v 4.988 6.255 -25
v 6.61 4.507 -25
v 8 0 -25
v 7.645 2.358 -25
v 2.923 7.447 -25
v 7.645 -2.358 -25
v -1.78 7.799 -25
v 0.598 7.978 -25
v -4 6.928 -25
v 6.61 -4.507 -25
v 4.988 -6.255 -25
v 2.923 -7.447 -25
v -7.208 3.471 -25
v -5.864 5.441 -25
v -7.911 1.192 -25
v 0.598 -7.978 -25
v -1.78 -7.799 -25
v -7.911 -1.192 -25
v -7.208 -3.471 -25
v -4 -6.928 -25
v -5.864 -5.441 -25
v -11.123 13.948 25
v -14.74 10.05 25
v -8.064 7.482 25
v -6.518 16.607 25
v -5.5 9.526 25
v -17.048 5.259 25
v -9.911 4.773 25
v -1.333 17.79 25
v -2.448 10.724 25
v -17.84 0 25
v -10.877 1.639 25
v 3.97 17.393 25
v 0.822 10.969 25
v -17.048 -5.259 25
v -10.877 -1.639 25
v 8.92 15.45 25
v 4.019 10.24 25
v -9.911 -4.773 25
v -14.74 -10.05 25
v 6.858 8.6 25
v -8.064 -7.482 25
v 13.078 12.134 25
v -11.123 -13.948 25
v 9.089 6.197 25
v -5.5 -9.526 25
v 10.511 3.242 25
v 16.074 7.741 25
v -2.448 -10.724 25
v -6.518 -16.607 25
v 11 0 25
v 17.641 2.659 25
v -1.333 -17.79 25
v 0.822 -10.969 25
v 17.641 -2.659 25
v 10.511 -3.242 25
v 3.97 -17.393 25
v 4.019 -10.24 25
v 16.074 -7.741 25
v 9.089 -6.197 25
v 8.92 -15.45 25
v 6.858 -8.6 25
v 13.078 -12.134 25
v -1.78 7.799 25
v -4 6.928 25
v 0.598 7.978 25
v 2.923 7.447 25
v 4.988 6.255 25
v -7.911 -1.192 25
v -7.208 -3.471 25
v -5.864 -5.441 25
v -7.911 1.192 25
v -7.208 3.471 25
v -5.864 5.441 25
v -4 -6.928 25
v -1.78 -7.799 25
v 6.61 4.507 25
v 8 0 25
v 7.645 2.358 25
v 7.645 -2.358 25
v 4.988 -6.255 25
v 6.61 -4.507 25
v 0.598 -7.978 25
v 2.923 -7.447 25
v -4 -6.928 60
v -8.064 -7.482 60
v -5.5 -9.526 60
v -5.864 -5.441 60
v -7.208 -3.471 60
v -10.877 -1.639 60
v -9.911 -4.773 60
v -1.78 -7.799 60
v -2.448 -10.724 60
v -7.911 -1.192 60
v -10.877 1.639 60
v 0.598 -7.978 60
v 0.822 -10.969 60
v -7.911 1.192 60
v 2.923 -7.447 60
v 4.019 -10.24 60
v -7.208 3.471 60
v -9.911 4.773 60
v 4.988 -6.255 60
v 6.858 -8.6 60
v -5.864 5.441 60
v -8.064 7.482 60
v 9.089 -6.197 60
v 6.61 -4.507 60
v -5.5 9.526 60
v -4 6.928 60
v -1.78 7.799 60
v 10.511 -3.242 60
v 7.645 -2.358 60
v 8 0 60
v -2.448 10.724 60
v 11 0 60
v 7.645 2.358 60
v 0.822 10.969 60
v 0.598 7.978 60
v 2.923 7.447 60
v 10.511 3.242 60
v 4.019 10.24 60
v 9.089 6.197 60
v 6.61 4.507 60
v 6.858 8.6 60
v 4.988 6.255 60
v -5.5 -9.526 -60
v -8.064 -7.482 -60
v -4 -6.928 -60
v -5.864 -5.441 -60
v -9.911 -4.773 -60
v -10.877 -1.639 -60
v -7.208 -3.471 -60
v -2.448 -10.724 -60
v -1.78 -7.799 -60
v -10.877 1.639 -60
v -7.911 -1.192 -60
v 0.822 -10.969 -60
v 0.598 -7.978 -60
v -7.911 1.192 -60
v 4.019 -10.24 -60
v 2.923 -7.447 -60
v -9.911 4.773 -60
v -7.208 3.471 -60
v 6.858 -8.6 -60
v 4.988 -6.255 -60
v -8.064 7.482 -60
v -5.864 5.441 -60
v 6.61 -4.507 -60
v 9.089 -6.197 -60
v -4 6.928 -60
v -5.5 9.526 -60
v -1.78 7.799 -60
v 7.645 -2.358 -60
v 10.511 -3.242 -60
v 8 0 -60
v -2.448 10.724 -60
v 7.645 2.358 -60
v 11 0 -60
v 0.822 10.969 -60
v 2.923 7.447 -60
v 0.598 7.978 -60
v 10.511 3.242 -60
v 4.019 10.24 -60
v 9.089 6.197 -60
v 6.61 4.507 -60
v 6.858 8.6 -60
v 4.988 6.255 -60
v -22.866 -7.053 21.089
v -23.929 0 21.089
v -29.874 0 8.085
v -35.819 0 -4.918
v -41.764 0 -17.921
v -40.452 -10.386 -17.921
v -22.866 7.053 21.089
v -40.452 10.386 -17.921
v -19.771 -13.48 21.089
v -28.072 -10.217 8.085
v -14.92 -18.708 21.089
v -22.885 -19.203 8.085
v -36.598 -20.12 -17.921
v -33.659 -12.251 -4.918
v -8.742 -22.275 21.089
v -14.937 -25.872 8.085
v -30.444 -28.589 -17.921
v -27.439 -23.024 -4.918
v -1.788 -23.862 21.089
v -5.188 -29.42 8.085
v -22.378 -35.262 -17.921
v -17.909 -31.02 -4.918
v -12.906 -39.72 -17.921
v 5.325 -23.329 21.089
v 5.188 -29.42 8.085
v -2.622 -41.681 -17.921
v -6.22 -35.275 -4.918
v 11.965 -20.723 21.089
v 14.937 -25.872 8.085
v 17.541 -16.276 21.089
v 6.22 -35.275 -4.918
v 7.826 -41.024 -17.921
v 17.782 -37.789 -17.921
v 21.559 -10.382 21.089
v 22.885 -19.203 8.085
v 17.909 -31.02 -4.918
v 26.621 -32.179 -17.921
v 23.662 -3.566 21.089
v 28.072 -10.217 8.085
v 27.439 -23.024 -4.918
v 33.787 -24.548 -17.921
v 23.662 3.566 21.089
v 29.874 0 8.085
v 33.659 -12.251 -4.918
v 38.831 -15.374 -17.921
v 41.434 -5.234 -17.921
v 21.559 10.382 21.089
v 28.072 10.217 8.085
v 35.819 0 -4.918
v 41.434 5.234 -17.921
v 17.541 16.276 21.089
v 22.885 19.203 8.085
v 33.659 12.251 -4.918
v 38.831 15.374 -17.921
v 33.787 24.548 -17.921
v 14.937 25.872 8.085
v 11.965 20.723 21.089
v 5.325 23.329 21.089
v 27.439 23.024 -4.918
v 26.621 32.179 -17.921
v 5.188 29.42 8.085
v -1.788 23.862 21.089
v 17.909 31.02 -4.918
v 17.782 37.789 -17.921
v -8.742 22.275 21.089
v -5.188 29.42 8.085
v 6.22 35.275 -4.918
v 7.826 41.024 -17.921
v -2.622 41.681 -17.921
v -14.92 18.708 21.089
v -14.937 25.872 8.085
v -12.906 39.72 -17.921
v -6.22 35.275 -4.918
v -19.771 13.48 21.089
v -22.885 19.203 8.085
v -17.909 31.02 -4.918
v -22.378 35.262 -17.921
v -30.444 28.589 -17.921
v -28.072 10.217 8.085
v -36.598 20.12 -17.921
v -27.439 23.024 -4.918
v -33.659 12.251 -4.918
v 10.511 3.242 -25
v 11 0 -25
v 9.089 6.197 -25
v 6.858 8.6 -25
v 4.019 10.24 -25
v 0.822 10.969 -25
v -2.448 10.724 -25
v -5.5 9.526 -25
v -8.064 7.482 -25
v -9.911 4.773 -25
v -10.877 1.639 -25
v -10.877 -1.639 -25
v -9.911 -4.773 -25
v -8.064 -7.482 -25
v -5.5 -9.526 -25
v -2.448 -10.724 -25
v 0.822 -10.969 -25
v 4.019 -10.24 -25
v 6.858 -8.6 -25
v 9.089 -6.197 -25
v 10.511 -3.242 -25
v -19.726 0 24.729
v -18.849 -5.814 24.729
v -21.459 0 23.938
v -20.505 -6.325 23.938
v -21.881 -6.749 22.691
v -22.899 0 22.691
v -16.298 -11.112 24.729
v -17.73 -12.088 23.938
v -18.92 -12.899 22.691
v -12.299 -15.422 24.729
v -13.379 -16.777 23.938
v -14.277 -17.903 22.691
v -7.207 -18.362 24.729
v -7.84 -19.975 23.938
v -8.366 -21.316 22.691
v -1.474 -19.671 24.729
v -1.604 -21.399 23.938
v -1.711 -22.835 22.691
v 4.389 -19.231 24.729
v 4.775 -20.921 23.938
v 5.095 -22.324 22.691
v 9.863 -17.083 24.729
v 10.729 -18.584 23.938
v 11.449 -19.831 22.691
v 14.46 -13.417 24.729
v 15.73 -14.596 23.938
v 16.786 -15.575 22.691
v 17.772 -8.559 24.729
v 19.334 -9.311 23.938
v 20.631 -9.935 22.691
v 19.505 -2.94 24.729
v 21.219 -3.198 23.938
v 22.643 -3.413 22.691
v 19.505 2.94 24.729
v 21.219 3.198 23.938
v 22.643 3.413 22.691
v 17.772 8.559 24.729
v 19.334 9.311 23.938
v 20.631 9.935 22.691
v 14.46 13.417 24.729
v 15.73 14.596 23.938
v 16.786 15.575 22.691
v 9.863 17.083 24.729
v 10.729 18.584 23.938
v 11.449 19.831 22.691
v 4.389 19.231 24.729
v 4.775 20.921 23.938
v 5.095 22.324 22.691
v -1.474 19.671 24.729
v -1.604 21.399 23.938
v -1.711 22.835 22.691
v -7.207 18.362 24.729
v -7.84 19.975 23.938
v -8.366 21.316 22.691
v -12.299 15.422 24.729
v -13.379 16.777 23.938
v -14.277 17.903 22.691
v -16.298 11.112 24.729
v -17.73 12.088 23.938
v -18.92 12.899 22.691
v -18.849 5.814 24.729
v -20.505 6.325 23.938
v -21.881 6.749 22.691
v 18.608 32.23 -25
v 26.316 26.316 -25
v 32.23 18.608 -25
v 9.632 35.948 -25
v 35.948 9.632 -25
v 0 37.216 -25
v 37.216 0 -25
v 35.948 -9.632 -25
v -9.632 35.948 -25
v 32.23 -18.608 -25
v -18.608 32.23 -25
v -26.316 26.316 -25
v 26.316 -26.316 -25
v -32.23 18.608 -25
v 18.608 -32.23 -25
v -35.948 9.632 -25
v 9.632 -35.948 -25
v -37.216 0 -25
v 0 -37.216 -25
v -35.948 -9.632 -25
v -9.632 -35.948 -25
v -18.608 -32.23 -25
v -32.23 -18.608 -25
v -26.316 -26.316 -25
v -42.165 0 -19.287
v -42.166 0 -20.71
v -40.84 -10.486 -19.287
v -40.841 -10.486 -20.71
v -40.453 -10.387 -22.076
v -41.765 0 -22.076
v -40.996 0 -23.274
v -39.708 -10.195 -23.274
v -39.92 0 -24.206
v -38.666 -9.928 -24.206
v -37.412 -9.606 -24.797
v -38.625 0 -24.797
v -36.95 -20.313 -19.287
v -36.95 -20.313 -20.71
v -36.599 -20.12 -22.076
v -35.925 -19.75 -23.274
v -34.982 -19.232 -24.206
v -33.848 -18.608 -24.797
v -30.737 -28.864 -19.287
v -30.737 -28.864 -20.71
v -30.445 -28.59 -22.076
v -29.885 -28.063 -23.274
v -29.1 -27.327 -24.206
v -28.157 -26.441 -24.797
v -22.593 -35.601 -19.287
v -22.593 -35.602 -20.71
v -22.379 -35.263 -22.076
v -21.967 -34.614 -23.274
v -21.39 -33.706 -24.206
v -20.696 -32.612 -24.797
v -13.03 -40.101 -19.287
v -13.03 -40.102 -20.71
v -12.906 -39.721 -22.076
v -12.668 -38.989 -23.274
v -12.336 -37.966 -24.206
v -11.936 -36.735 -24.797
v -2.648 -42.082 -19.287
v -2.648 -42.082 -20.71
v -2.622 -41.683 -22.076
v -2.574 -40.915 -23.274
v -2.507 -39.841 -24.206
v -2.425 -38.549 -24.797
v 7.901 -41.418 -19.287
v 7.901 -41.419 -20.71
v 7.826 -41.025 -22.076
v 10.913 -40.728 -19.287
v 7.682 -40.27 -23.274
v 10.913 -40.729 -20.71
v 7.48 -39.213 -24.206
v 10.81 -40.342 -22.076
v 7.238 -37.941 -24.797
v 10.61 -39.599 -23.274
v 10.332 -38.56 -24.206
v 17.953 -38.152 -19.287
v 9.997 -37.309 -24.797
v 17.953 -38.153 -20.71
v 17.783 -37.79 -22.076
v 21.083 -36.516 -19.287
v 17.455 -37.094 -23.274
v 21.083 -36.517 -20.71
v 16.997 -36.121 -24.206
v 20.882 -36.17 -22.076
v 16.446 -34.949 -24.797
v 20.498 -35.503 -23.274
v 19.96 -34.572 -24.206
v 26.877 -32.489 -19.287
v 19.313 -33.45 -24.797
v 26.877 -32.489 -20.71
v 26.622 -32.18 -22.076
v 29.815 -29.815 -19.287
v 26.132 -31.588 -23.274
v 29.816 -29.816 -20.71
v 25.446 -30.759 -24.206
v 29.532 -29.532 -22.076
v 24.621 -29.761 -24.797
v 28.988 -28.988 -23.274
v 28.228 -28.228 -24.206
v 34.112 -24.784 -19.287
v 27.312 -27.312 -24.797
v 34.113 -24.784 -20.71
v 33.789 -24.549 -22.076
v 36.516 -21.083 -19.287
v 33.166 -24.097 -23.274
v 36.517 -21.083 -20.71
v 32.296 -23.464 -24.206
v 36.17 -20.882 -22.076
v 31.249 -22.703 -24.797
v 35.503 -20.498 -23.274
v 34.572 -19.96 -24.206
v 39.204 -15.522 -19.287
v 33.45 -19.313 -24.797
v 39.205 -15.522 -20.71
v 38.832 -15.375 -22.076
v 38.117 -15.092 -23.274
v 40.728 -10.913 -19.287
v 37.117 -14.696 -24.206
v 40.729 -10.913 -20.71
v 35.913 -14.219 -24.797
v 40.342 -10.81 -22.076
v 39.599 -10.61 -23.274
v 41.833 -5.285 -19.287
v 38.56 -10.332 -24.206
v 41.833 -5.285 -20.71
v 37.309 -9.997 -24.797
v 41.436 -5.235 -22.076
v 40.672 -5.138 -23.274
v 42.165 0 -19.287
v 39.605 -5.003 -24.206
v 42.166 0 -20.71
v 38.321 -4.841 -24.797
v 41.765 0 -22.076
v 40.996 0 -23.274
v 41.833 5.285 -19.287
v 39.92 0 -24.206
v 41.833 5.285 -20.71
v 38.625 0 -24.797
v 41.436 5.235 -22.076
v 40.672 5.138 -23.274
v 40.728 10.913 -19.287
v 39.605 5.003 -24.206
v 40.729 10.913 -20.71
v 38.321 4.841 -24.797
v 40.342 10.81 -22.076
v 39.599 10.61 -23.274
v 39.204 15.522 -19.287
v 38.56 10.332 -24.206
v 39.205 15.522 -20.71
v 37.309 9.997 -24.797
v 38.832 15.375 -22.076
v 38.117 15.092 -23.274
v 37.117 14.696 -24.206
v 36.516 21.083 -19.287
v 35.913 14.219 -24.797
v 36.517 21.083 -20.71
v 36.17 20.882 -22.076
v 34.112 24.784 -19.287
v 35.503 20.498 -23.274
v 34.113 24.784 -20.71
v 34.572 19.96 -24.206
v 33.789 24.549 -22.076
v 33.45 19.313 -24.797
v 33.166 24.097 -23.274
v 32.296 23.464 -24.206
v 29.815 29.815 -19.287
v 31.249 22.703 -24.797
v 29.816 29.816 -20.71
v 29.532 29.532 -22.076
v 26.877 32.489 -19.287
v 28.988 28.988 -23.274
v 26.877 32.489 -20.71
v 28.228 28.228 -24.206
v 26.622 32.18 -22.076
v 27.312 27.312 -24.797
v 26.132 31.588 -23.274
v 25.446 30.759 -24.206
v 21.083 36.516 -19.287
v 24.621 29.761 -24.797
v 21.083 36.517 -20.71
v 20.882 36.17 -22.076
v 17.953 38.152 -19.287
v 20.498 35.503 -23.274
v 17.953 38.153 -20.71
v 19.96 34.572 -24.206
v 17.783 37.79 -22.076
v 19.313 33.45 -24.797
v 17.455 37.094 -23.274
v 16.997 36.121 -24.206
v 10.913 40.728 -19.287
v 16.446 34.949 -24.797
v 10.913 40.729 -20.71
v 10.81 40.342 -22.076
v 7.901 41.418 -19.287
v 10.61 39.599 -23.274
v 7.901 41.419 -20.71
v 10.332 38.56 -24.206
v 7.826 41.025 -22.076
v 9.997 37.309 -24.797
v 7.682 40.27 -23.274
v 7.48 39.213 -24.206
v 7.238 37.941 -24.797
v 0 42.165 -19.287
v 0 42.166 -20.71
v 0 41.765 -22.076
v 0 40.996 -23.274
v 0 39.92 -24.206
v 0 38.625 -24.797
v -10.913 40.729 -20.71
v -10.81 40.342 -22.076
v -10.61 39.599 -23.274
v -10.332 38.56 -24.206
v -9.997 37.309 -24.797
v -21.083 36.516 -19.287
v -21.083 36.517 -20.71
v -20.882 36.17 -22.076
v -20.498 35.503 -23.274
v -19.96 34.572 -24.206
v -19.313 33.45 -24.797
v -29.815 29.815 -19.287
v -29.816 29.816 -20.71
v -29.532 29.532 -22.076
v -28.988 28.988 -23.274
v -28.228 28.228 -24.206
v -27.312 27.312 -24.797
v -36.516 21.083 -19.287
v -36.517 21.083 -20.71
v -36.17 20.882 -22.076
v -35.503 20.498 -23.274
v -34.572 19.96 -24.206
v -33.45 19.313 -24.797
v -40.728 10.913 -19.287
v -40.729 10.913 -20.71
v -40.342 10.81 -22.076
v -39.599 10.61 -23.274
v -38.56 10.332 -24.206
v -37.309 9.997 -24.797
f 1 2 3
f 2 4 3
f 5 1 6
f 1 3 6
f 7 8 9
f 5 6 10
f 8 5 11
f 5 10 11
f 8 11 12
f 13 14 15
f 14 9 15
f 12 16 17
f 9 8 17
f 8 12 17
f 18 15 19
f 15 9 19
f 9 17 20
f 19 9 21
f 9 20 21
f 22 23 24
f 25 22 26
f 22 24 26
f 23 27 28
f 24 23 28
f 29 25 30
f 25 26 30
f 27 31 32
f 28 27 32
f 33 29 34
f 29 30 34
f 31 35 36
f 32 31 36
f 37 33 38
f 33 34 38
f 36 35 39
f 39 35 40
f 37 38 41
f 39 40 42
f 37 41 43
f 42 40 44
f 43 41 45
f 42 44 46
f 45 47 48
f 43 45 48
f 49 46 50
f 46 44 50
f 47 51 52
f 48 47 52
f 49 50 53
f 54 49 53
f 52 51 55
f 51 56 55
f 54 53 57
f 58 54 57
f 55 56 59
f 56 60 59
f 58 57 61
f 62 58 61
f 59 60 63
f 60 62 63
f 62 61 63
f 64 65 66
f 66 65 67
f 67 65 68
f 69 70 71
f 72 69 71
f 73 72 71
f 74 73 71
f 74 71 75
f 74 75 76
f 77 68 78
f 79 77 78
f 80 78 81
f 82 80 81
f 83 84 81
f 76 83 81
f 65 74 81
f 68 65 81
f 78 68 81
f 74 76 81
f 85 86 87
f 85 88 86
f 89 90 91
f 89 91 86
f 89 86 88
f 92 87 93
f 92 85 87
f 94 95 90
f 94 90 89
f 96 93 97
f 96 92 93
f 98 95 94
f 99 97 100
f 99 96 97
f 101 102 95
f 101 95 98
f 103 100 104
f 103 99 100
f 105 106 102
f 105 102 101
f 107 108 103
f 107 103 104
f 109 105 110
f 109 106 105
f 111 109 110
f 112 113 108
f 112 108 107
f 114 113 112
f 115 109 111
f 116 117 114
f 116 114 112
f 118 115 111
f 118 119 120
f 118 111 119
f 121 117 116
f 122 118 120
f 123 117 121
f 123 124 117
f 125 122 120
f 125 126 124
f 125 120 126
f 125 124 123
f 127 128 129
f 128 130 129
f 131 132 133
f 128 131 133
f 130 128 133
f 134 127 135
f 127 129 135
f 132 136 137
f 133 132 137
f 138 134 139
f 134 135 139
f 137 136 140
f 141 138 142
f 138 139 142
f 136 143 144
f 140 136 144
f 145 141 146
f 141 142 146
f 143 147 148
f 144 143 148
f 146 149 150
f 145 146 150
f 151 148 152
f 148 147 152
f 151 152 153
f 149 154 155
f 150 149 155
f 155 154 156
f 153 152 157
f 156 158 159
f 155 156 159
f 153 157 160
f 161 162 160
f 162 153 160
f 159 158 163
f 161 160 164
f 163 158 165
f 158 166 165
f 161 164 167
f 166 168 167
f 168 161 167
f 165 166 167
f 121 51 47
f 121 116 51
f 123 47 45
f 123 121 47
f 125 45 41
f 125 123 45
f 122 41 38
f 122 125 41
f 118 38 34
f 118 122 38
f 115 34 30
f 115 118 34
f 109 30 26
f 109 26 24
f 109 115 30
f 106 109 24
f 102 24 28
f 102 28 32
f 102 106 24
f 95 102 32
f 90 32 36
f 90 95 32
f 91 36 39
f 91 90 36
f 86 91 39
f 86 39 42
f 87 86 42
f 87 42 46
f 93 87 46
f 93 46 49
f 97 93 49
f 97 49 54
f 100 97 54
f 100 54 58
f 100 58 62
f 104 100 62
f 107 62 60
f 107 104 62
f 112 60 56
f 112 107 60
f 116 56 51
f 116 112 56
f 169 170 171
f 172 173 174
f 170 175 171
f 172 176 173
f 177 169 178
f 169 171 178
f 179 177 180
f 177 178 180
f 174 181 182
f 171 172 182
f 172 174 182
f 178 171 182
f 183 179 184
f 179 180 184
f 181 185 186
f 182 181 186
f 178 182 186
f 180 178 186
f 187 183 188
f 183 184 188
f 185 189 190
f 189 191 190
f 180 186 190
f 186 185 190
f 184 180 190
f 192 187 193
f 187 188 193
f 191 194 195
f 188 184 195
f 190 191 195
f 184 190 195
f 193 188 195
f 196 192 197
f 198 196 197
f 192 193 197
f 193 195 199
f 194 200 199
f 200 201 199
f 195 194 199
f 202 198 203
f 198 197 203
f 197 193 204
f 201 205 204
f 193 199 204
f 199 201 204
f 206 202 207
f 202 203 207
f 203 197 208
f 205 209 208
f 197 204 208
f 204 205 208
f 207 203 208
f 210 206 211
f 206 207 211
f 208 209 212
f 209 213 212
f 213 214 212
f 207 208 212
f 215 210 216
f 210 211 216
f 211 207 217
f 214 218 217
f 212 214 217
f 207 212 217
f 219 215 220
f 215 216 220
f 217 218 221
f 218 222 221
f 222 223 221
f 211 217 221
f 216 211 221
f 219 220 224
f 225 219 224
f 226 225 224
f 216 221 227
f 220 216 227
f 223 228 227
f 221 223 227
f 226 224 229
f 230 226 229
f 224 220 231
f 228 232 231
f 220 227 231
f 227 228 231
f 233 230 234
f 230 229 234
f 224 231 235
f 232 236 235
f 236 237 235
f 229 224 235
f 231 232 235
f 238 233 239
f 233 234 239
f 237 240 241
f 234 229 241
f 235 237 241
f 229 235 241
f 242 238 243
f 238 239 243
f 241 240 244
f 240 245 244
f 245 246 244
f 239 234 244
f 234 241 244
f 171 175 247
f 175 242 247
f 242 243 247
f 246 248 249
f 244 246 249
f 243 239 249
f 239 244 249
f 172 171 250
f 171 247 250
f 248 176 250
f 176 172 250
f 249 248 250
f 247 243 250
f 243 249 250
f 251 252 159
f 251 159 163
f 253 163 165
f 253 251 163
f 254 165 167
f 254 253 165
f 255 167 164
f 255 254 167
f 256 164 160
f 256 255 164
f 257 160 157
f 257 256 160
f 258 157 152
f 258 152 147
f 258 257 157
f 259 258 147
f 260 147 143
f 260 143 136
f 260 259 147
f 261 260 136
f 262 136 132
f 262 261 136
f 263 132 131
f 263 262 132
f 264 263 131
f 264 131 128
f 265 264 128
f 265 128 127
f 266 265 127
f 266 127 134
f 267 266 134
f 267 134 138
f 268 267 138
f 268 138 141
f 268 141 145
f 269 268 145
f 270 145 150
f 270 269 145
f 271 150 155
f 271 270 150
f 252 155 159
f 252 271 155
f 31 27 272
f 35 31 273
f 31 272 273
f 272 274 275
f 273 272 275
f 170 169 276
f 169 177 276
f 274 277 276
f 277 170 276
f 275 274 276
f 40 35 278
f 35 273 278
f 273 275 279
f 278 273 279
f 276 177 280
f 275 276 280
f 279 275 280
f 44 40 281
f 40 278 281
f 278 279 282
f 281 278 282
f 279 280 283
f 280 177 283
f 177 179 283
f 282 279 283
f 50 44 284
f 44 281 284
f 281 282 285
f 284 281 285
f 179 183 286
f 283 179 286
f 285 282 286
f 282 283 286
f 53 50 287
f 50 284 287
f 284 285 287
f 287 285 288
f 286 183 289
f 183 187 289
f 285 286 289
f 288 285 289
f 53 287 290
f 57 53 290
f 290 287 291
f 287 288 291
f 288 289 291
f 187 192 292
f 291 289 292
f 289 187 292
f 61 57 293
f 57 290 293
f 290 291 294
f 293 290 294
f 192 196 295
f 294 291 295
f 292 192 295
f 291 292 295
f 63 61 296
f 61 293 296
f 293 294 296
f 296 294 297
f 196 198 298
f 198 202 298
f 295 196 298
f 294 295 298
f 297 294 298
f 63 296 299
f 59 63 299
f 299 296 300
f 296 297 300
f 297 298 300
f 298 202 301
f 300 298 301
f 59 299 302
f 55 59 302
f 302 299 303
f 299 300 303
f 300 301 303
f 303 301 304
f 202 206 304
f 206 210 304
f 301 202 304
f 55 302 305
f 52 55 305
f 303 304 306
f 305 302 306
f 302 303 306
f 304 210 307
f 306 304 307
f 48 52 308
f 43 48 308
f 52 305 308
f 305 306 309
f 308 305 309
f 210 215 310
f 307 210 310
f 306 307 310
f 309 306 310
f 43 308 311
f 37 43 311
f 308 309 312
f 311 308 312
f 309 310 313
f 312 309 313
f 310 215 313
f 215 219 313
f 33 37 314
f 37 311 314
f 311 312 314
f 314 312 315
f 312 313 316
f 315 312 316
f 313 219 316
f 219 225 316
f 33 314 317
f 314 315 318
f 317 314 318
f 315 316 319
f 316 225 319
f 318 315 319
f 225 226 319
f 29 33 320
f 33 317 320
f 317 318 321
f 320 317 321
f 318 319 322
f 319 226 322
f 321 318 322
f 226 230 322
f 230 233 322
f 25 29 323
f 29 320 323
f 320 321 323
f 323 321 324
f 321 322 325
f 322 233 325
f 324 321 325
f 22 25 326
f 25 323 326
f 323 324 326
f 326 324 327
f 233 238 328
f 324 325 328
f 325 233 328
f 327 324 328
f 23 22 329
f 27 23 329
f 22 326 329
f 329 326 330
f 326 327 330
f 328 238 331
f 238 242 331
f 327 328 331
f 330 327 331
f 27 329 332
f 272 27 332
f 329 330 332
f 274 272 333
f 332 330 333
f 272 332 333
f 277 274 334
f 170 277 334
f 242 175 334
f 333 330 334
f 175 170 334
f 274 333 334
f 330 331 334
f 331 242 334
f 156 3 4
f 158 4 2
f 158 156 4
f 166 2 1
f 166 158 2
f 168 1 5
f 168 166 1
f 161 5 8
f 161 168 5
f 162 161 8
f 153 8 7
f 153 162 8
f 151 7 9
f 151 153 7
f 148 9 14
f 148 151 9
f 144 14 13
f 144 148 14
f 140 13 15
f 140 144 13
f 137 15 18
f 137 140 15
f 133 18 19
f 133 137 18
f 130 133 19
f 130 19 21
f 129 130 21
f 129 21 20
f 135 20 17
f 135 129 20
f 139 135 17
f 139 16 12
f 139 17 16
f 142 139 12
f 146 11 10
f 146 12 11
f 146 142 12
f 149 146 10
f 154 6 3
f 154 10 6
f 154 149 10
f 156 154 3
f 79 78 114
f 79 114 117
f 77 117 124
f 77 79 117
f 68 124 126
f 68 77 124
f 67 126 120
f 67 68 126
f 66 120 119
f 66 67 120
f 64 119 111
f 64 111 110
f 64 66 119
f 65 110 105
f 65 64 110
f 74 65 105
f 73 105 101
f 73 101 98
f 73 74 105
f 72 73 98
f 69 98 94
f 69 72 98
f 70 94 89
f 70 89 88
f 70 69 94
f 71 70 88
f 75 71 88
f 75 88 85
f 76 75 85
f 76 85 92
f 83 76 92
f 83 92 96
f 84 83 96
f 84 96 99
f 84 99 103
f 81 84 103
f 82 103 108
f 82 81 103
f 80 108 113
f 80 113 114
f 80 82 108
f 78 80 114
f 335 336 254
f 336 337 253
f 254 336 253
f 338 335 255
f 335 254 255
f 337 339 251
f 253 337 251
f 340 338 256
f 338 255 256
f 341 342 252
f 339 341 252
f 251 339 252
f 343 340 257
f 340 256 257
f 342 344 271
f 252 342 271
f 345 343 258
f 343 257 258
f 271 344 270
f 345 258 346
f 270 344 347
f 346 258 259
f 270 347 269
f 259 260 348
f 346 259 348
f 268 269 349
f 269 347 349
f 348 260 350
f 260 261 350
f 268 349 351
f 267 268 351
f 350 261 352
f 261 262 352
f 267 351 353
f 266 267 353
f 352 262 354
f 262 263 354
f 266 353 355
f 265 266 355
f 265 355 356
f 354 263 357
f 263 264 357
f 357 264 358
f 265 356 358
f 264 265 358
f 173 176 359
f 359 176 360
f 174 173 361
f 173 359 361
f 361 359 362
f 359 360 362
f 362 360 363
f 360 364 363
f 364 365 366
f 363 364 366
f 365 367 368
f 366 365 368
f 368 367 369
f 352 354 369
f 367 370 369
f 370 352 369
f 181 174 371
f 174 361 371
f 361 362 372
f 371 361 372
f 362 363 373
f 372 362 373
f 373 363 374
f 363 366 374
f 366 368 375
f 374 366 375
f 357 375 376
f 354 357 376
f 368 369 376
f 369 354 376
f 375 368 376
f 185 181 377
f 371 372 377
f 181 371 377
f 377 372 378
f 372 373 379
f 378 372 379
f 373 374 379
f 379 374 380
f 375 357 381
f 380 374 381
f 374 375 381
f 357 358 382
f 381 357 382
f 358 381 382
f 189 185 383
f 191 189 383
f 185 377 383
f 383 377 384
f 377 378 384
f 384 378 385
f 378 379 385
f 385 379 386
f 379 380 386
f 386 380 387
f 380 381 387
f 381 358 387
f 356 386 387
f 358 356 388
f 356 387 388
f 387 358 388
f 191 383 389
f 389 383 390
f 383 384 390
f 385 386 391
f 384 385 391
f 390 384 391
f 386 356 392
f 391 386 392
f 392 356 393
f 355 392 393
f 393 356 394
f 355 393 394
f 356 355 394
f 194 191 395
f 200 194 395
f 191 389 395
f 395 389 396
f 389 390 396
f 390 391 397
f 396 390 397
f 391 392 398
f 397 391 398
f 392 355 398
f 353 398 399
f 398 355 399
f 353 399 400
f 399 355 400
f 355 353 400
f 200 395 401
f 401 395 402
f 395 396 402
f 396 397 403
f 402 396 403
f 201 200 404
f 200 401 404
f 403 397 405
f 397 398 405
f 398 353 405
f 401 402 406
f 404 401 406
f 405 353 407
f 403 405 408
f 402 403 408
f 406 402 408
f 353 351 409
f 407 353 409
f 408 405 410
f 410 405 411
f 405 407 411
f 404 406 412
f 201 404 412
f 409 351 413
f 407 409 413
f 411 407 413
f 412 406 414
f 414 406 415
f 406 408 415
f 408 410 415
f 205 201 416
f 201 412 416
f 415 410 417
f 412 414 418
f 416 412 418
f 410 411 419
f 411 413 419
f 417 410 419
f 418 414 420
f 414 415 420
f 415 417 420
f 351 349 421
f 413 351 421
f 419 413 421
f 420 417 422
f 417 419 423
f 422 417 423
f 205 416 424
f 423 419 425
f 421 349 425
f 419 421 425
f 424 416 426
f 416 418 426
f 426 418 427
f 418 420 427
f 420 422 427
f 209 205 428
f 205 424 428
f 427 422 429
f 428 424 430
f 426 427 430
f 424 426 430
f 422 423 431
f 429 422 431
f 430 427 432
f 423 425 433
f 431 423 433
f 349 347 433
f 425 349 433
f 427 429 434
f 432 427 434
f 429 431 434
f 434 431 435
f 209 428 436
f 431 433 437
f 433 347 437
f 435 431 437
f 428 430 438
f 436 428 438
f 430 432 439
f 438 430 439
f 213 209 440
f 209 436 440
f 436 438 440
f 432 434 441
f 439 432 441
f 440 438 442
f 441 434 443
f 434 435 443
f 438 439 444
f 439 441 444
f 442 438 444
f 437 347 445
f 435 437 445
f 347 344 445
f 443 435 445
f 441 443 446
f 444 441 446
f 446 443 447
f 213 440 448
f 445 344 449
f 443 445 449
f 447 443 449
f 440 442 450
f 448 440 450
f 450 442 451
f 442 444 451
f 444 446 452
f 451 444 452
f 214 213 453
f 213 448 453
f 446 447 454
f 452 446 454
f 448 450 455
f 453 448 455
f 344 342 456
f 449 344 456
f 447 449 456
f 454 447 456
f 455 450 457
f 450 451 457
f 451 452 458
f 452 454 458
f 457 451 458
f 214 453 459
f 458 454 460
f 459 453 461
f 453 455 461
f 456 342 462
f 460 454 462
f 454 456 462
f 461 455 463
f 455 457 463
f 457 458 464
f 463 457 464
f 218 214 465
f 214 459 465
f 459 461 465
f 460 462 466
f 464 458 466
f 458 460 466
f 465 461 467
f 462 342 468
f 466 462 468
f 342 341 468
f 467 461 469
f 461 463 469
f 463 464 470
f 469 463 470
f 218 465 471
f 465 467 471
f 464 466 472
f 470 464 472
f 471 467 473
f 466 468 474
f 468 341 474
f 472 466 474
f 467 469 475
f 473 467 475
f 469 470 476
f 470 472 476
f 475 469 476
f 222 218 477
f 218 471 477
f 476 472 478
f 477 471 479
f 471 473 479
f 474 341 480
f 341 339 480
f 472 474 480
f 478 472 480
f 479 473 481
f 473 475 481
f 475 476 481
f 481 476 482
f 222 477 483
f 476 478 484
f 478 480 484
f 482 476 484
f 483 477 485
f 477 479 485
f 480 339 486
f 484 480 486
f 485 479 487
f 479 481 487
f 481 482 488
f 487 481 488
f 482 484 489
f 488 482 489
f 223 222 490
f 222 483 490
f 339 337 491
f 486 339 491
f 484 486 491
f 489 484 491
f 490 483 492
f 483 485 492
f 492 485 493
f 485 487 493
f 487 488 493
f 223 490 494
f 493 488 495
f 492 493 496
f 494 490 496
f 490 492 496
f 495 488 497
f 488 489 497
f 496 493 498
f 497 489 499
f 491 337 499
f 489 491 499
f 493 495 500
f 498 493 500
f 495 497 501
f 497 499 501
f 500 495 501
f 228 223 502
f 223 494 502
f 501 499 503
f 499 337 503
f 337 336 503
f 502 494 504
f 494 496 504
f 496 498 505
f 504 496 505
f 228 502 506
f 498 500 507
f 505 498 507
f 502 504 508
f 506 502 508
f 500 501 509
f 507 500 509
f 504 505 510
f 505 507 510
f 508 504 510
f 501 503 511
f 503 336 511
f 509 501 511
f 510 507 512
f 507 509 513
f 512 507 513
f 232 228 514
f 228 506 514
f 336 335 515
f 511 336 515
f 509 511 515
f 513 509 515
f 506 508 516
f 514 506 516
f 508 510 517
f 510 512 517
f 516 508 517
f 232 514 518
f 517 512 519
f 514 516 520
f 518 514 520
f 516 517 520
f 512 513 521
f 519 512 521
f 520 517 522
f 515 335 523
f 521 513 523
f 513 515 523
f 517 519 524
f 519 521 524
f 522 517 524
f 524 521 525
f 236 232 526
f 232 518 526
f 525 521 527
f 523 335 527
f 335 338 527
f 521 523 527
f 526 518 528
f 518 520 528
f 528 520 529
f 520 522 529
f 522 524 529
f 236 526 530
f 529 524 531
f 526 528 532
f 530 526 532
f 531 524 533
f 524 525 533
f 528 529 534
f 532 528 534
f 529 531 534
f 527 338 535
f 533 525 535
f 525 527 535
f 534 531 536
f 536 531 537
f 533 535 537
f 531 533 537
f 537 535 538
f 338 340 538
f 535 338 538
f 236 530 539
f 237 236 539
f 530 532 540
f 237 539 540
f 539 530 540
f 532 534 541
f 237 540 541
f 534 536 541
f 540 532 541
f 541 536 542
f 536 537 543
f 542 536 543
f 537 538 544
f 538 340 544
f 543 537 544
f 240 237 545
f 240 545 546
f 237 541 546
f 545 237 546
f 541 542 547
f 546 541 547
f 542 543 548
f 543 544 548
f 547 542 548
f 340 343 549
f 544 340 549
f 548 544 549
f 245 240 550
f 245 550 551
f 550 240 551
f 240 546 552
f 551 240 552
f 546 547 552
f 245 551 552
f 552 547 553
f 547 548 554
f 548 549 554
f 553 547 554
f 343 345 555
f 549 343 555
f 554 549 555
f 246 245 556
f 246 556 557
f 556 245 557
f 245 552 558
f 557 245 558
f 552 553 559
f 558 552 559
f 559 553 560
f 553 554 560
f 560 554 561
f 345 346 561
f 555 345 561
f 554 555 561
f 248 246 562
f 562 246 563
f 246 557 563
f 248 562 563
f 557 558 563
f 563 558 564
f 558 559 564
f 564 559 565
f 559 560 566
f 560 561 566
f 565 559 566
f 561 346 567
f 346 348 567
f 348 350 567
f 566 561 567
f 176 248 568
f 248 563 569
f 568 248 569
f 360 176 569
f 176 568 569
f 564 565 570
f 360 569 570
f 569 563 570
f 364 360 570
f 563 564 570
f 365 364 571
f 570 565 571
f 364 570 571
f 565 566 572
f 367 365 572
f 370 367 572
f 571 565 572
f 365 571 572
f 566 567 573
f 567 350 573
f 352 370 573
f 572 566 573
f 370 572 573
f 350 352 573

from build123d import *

# Parameters (mm, degrees)
SKETCH1_R           = 11
SKETCH1_R_2         = 8
BOSS_EXTRUDE1_DEPTH = 60


with BuildPart() as part:
    # Sketch1 → Boss-Extrude1 (new, symmetric)
    with BuildSketch(Plane.XY):
        Circle(SKETCH1_R)
        Circle(SKETCH1_R_2, mode=Mode.SUBTRACT)
    extrude(amount=BOSS_EXTRUDE1_DEPTH, both=True)

    # Sketch2 → Revolve1 (revolve)
    with BuildSketch(Plane(origin=(0, 0, 0), x_dir=(0, 0, -1), z_dir=(1, 0, 0)), mode=Mode.PRIVATE) as revolve1_sk:
        with BuildLine():
            Line((-25, 0), (-25, 17.840263865))
            ThreePointArc((-25, 17.840263865), (-23.93794832, 21.458657097), (-21.088750877, 23.929041134))
            Line((-21.088750877, 23.929041134), (17.921053029, 41.76363109))
            ThreePointArc((17.921053029, 41.76363109), (22.702338353, 41.423150362), (25, 37.21632645))
            Line((25, 37.21632645), (25, 0))
            Line((25, 0), (-25, 0))
        make_face()
    revolve(revolve1_sk.sketch.rotate(Axis((0, 0, -25), (0, 0, 1)), 90), axis=Axis((0, 0, -25), (0, 0, 1)))


solid = part.part
